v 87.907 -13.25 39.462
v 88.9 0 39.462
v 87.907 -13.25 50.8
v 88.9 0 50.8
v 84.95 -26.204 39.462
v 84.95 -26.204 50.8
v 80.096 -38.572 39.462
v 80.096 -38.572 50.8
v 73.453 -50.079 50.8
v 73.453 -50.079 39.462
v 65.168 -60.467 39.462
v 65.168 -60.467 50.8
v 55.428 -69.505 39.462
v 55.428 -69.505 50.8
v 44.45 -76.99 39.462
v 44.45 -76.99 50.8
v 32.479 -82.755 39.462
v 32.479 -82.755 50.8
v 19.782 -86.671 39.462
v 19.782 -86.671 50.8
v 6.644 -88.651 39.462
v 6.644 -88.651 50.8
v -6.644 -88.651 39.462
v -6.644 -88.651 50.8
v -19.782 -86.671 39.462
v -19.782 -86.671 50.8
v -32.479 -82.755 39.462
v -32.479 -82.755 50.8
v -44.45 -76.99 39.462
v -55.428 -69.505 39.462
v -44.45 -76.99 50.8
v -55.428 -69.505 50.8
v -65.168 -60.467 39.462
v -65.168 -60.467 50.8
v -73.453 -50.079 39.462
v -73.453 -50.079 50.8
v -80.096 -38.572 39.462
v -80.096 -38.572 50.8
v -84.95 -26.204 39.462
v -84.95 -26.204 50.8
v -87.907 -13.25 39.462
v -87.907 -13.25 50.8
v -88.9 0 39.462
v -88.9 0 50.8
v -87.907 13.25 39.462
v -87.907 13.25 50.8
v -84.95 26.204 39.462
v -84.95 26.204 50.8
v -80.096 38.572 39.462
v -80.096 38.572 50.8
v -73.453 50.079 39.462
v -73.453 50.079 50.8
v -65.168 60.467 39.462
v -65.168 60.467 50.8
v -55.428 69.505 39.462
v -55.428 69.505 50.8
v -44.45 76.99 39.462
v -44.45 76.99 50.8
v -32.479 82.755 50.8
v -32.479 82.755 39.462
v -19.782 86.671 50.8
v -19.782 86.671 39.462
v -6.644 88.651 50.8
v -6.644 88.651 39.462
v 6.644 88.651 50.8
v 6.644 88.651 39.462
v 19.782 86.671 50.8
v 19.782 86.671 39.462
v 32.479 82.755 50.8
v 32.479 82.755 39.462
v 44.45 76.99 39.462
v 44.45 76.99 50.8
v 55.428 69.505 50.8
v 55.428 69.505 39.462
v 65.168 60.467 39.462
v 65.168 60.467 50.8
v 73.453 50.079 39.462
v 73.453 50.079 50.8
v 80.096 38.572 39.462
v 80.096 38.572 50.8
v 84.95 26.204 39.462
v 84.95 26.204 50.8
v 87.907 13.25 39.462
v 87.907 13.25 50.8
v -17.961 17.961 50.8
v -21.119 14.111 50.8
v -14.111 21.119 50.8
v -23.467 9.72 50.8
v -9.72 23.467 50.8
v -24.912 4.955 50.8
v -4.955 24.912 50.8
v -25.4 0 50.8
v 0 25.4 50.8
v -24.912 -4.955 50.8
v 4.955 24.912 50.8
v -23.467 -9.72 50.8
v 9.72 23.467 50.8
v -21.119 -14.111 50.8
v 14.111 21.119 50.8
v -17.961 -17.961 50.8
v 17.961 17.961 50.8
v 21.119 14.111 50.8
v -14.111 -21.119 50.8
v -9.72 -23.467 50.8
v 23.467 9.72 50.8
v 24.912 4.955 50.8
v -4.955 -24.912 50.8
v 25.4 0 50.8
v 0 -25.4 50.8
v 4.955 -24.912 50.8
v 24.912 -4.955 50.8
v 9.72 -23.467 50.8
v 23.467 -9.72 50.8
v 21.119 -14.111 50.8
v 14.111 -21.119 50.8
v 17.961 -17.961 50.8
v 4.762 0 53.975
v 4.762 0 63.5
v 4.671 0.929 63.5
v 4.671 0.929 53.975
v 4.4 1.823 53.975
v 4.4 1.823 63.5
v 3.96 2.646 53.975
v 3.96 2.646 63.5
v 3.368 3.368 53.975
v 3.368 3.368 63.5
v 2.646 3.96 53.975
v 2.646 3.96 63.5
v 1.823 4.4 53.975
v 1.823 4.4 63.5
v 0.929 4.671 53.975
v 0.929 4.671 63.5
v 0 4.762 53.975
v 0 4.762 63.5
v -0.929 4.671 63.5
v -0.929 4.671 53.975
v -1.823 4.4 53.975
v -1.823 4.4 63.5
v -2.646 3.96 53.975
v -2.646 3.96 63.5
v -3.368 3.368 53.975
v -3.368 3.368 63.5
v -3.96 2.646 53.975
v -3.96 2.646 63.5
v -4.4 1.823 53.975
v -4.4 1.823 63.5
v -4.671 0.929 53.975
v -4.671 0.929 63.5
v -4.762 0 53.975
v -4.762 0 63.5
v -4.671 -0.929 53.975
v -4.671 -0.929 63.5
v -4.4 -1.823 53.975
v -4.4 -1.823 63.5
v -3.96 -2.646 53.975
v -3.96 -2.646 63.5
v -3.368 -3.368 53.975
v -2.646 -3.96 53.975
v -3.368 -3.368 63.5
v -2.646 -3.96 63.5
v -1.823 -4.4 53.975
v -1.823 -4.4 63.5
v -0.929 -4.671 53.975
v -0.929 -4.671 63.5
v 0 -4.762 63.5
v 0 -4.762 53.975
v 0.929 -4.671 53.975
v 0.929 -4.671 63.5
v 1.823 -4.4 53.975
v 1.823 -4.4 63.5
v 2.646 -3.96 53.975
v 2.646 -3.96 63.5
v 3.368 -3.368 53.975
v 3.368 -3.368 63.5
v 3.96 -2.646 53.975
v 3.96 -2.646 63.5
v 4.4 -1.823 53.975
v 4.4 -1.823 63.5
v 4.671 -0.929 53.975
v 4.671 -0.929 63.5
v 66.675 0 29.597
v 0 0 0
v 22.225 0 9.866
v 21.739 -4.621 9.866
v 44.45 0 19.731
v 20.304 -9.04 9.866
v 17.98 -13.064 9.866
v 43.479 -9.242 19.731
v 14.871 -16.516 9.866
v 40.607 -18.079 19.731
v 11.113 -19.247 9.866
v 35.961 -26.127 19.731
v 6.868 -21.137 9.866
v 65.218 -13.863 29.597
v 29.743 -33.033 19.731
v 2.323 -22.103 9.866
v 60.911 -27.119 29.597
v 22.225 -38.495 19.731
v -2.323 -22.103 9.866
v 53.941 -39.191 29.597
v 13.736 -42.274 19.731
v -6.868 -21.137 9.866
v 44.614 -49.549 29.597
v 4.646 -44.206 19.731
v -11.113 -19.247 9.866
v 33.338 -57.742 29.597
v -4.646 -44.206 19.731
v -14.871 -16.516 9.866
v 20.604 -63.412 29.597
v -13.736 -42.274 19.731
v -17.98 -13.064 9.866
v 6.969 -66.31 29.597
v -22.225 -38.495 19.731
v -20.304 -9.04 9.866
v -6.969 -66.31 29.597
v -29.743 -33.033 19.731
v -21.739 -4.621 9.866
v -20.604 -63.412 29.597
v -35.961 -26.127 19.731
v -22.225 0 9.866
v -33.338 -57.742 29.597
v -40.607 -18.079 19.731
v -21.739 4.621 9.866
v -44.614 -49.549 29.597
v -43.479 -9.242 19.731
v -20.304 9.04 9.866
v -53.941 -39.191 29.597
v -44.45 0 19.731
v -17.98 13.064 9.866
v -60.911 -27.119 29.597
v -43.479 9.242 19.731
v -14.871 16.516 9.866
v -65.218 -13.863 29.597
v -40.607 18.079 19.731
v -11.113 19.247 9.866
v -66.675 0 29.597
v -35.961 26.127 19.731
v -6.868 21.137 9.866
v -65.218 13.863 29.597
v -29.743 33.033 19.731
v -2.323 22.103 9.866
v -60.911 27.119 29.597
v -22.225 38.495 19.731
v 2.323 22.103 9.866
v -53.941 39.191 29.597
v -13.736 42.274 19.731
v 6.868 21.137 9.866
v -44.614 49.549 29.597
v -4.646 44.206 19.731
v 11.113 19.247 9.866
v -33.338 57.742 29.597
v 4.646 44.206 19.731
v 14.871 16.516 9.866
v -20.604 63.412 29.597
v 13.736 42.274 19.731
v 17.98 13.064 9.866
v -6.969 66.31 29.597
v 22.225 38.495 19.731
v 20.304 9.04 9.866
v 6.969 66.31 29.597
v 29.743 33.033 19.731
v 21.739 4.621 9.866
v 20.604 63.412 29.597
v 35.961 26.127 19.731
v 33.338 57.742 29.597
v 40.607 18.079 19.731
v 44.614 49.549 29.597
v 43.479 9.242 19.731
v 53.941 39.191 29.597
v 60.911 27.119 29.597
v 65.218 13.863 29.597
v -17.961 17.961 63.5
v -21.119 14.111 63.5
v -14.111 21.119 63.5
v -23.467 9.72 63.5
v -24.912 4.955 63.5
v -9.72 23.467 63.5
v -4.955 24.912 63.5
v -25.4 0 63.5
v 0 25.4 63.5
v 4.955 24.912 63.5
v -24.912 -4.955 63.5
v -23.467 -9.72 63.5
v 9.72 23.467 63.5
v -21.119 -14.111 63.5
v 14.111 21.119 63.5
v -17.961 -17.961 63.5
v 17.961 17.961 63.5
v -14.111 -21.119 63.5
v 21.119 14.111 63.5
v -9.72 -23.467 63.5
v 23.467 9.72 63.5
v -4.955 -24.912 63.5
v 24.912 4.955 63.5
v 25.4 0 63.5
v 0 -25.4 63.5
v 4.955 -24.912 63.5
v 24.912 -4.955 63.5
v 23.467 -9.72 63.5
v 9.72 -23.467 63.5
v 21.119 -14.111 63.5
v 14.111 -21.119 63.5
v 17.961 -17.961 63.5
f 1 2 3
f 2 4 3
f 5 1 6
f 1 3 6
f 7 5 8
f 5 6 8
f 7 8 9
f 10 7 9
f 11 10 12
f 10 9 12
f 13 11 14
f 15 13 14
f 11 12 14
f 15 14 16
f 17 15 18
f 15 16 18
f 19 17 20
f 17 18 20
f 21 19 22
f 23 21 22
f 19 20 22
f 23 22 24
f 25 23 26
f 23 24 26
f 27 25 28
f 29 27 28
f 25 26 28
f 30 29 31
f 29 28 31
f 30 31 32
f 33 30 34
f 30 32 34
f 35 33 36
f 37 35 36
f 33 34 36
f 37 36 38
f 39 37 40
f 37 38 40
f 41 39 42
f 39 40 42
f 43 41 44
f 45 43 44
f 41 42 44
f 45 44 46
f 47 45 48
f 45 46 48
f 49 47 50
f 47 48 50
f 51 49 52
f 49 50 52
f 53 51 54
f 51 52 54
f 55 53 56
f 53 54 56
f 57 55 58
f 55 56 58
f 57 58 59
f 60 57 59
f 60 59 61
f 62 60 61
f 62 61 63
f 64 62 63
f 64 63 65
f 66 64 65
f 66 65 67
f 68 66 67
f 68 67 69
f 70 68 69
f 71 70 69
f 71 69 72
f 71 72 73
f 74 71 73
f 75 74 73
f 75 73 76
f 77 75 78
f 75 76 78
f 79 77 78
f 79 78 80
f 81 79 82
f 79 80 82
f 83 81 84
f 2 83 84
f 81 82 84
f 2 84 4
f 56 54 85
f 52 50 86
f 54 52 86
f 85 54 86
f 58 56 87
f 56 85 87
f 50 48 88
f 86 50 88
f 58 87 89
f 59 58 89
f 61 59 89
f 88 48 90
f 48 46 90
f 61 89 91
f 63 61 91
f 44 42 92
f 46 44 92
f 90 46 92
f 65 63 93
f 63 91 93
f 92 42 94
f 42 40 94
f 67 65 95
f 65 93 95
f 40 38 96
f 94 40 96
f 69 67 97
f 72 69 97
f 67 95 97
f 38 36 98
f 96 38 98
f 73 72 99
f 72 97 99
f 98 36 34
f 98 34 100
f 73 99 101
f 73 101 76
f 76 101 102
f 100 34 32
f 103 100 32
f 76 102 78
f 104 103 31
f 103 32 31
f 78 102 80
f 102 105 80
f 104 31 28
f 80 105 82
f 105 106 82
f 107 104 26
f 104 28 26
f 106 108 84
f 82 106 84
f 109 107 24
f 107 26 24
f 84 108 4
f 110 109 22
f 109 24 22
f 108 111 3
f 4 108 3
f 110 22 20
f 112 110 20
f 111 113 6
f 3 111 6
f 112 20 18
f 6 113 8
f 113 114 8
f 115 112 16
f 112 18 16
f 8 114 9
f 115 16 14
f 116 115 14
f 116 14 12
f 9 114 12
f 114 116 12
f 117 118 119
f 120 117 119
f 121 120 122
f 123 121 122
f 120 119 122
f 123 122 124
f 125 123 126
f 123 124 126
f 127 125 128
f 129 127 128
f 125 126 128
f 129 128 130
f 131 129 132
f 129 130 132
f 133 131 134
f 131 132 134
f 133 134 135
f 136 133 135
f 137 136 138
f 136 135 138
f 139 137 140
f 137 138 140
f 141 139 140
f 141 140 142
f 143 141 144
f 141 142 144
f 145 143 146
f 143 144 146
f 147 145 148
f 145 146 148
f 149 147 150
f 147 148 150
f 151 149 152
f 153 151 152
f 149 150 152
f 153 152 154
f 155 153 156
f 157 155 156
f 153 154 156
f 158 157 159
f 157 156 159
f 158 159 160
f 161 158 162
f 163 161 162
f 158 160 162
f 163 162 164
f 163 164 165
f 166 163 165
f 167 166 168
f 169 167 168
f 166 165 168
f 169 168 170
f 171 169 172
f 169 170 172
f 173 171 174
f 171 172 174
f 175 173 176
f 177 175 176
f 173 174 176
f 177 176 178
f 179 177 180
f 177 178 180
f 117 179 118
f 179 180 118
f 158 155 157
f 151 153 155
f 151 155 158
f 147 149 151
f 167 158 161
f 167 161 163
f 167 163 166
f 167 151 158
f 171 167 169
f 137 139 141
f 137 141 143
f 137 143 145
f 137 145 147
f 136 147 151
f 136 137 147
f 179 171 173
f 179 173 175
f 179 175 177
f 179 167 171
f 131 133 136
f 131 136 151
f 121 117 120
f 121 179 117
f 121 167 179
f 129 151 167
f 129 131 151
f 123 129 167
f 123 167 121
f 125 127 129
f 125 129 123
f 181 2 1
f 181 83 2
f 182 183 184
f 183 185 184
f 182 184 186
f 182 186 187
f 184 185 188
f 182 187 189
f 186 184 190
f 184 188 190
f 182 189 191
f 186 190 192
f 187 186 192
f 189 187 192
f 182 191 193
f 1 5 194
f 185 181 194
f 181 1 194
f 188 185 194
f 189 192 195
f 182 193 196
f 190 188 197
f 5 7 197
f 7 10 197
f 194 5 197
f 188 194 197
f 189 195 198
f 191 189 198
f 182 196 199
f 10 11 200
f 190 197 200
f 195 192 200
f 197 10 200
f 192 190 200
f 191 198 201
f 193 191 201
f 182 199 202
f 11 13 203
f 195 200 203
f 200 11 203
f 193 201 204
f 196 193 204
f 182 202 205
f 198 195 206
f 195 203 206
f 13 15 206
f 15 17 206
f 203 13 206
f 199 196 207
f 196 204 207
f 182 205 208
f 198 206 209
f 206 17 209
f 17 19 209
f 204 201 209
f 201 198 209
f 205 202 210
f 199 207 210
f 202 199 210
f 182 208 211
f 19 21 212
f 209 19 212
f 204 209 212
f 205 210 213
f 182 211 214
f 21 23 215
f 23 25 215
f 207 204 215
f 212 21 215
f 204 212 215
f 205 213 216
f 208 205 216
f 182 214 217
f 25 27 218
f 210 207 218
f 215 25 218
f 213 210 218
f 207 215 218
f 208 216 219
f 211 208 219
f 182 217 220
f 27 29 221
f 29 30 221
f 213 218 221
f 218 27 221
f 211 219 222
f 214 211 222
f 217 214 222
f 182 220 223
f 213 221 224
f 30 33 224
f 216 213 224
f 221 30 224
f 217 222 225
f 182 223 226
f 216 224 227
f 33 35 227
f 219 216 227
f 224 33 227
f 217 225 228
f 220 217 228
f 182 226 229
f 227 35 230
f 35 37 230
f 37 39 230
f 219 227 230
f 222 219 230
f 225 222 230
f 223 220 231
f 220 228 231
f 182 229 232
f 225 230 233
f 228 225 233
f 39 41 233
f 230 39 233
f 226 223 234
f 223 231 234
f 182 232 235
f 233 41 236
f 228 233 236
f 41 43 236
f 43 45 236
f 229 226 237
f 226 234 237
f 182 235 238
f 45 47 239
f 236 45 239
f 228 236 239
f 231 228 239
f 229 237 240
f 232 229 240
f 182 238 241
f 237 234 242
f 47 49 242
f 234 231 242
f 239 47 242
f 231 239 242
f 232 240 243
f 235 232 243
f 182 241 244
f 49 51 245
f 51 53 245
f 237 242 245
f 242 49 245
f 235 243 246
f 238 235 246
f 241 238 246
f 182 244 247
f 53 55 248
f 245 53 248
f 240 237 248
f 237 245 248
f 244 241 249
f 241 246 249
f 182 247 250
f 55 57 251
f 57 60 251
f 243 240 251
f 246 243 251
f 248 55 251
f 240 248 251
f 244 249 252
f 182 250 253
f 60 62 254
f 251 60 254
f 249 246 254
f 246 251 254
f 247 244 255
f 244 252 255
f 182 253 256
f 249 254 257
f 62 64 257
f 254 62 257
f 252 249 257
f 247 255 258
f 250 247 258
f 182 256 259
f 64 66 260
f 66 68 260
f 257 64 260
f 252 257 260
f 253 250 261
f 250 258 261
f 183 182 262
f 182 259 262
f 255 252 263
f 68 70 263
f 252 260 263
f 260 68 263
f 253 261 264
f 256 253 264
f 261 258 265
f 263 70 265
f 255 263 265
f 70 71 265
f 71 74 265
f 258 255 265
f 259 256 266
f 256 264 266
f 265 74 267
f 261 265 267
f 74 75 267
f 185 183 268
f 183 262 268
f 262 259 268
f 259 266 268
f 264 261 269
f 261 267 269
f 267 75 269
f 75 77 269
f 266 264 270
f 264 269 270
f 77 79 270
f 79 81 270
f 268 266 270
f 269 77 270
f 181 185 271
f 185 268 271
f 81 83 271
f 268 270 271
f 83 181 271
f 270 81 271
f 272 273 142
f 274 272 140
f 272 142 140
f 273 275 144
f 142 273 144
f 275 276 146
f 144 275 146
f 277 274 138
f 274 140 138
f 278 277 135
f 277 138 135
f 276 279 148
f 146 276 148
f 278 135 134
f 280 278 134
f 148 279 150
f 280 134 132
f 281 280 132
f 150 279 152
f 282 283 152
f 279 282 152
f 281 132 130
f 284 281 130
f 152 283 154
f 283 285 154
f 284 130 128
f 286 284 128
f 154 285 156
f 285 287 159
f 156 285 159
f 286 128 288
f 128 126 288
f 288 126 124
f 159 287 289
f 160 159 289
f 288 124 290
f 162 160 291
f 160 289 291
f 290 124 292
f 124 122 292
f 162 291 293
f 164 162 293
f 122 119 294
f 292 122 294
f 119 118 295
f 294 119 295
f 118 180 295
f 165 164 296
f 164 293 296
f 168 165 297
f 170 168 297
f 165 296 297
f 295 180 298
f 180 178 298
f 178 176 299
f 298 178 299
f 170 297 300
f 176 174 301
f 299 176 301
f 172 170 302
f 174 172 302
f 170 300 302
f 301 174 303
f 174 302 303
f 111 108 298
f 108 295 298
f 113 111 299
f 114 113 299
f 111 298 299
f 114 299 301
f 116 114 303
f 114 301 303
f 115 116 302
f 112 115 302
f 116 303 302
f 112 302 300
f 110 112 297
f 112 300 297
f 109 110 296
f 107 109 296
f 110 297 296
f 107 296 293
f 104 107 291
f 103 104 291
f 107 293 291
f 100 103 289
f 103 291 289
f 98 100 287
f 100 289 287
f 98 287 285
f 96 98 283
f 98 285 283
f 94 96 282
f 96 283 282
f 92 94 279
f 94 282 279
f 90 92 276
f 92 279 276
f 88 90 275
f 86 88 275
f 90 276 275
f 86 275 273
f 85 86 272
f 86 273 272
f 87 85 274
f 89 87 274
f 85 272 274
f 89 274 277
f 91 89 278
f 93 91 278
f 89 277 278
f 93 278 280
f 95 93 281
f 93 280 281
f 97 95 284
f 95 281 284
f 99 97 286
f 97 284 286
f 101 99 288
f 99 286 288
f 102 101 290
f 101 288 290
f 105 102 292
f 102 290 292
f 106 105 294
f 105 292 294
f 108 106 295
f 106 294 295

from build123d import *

# Parameters (mm, degrees)
F2_R     = 4.7625
F3_DEPTH = 9.525


# Not quite as in the source:
# - the program builds the solid bodies; features that only make, move or delete a surface that nothing else refers to are left out


with BuildPart() as f1:
    # F0 (on Front) → F1 (revolve)
    with BuildSketch(Plane.XZ):
        Polygon((0, 63.5), (0, 0), (88.9, 39.4620286852), (88.9, 50.8), (25.4, 50.8), (25.4, 63.5), align=None)
    revolve(axis=Axis((0, 0, 31.75), (0, 0, -1)))

    # F2 (on face) → F3 (cut)
    with BuildSketch(Plane.XY.offset(63.5)):
        Circle(F2_R)
    extrude(amount=-F3_DEPTH, mode=Mode.SUBTRACT)


solid = f1.part
